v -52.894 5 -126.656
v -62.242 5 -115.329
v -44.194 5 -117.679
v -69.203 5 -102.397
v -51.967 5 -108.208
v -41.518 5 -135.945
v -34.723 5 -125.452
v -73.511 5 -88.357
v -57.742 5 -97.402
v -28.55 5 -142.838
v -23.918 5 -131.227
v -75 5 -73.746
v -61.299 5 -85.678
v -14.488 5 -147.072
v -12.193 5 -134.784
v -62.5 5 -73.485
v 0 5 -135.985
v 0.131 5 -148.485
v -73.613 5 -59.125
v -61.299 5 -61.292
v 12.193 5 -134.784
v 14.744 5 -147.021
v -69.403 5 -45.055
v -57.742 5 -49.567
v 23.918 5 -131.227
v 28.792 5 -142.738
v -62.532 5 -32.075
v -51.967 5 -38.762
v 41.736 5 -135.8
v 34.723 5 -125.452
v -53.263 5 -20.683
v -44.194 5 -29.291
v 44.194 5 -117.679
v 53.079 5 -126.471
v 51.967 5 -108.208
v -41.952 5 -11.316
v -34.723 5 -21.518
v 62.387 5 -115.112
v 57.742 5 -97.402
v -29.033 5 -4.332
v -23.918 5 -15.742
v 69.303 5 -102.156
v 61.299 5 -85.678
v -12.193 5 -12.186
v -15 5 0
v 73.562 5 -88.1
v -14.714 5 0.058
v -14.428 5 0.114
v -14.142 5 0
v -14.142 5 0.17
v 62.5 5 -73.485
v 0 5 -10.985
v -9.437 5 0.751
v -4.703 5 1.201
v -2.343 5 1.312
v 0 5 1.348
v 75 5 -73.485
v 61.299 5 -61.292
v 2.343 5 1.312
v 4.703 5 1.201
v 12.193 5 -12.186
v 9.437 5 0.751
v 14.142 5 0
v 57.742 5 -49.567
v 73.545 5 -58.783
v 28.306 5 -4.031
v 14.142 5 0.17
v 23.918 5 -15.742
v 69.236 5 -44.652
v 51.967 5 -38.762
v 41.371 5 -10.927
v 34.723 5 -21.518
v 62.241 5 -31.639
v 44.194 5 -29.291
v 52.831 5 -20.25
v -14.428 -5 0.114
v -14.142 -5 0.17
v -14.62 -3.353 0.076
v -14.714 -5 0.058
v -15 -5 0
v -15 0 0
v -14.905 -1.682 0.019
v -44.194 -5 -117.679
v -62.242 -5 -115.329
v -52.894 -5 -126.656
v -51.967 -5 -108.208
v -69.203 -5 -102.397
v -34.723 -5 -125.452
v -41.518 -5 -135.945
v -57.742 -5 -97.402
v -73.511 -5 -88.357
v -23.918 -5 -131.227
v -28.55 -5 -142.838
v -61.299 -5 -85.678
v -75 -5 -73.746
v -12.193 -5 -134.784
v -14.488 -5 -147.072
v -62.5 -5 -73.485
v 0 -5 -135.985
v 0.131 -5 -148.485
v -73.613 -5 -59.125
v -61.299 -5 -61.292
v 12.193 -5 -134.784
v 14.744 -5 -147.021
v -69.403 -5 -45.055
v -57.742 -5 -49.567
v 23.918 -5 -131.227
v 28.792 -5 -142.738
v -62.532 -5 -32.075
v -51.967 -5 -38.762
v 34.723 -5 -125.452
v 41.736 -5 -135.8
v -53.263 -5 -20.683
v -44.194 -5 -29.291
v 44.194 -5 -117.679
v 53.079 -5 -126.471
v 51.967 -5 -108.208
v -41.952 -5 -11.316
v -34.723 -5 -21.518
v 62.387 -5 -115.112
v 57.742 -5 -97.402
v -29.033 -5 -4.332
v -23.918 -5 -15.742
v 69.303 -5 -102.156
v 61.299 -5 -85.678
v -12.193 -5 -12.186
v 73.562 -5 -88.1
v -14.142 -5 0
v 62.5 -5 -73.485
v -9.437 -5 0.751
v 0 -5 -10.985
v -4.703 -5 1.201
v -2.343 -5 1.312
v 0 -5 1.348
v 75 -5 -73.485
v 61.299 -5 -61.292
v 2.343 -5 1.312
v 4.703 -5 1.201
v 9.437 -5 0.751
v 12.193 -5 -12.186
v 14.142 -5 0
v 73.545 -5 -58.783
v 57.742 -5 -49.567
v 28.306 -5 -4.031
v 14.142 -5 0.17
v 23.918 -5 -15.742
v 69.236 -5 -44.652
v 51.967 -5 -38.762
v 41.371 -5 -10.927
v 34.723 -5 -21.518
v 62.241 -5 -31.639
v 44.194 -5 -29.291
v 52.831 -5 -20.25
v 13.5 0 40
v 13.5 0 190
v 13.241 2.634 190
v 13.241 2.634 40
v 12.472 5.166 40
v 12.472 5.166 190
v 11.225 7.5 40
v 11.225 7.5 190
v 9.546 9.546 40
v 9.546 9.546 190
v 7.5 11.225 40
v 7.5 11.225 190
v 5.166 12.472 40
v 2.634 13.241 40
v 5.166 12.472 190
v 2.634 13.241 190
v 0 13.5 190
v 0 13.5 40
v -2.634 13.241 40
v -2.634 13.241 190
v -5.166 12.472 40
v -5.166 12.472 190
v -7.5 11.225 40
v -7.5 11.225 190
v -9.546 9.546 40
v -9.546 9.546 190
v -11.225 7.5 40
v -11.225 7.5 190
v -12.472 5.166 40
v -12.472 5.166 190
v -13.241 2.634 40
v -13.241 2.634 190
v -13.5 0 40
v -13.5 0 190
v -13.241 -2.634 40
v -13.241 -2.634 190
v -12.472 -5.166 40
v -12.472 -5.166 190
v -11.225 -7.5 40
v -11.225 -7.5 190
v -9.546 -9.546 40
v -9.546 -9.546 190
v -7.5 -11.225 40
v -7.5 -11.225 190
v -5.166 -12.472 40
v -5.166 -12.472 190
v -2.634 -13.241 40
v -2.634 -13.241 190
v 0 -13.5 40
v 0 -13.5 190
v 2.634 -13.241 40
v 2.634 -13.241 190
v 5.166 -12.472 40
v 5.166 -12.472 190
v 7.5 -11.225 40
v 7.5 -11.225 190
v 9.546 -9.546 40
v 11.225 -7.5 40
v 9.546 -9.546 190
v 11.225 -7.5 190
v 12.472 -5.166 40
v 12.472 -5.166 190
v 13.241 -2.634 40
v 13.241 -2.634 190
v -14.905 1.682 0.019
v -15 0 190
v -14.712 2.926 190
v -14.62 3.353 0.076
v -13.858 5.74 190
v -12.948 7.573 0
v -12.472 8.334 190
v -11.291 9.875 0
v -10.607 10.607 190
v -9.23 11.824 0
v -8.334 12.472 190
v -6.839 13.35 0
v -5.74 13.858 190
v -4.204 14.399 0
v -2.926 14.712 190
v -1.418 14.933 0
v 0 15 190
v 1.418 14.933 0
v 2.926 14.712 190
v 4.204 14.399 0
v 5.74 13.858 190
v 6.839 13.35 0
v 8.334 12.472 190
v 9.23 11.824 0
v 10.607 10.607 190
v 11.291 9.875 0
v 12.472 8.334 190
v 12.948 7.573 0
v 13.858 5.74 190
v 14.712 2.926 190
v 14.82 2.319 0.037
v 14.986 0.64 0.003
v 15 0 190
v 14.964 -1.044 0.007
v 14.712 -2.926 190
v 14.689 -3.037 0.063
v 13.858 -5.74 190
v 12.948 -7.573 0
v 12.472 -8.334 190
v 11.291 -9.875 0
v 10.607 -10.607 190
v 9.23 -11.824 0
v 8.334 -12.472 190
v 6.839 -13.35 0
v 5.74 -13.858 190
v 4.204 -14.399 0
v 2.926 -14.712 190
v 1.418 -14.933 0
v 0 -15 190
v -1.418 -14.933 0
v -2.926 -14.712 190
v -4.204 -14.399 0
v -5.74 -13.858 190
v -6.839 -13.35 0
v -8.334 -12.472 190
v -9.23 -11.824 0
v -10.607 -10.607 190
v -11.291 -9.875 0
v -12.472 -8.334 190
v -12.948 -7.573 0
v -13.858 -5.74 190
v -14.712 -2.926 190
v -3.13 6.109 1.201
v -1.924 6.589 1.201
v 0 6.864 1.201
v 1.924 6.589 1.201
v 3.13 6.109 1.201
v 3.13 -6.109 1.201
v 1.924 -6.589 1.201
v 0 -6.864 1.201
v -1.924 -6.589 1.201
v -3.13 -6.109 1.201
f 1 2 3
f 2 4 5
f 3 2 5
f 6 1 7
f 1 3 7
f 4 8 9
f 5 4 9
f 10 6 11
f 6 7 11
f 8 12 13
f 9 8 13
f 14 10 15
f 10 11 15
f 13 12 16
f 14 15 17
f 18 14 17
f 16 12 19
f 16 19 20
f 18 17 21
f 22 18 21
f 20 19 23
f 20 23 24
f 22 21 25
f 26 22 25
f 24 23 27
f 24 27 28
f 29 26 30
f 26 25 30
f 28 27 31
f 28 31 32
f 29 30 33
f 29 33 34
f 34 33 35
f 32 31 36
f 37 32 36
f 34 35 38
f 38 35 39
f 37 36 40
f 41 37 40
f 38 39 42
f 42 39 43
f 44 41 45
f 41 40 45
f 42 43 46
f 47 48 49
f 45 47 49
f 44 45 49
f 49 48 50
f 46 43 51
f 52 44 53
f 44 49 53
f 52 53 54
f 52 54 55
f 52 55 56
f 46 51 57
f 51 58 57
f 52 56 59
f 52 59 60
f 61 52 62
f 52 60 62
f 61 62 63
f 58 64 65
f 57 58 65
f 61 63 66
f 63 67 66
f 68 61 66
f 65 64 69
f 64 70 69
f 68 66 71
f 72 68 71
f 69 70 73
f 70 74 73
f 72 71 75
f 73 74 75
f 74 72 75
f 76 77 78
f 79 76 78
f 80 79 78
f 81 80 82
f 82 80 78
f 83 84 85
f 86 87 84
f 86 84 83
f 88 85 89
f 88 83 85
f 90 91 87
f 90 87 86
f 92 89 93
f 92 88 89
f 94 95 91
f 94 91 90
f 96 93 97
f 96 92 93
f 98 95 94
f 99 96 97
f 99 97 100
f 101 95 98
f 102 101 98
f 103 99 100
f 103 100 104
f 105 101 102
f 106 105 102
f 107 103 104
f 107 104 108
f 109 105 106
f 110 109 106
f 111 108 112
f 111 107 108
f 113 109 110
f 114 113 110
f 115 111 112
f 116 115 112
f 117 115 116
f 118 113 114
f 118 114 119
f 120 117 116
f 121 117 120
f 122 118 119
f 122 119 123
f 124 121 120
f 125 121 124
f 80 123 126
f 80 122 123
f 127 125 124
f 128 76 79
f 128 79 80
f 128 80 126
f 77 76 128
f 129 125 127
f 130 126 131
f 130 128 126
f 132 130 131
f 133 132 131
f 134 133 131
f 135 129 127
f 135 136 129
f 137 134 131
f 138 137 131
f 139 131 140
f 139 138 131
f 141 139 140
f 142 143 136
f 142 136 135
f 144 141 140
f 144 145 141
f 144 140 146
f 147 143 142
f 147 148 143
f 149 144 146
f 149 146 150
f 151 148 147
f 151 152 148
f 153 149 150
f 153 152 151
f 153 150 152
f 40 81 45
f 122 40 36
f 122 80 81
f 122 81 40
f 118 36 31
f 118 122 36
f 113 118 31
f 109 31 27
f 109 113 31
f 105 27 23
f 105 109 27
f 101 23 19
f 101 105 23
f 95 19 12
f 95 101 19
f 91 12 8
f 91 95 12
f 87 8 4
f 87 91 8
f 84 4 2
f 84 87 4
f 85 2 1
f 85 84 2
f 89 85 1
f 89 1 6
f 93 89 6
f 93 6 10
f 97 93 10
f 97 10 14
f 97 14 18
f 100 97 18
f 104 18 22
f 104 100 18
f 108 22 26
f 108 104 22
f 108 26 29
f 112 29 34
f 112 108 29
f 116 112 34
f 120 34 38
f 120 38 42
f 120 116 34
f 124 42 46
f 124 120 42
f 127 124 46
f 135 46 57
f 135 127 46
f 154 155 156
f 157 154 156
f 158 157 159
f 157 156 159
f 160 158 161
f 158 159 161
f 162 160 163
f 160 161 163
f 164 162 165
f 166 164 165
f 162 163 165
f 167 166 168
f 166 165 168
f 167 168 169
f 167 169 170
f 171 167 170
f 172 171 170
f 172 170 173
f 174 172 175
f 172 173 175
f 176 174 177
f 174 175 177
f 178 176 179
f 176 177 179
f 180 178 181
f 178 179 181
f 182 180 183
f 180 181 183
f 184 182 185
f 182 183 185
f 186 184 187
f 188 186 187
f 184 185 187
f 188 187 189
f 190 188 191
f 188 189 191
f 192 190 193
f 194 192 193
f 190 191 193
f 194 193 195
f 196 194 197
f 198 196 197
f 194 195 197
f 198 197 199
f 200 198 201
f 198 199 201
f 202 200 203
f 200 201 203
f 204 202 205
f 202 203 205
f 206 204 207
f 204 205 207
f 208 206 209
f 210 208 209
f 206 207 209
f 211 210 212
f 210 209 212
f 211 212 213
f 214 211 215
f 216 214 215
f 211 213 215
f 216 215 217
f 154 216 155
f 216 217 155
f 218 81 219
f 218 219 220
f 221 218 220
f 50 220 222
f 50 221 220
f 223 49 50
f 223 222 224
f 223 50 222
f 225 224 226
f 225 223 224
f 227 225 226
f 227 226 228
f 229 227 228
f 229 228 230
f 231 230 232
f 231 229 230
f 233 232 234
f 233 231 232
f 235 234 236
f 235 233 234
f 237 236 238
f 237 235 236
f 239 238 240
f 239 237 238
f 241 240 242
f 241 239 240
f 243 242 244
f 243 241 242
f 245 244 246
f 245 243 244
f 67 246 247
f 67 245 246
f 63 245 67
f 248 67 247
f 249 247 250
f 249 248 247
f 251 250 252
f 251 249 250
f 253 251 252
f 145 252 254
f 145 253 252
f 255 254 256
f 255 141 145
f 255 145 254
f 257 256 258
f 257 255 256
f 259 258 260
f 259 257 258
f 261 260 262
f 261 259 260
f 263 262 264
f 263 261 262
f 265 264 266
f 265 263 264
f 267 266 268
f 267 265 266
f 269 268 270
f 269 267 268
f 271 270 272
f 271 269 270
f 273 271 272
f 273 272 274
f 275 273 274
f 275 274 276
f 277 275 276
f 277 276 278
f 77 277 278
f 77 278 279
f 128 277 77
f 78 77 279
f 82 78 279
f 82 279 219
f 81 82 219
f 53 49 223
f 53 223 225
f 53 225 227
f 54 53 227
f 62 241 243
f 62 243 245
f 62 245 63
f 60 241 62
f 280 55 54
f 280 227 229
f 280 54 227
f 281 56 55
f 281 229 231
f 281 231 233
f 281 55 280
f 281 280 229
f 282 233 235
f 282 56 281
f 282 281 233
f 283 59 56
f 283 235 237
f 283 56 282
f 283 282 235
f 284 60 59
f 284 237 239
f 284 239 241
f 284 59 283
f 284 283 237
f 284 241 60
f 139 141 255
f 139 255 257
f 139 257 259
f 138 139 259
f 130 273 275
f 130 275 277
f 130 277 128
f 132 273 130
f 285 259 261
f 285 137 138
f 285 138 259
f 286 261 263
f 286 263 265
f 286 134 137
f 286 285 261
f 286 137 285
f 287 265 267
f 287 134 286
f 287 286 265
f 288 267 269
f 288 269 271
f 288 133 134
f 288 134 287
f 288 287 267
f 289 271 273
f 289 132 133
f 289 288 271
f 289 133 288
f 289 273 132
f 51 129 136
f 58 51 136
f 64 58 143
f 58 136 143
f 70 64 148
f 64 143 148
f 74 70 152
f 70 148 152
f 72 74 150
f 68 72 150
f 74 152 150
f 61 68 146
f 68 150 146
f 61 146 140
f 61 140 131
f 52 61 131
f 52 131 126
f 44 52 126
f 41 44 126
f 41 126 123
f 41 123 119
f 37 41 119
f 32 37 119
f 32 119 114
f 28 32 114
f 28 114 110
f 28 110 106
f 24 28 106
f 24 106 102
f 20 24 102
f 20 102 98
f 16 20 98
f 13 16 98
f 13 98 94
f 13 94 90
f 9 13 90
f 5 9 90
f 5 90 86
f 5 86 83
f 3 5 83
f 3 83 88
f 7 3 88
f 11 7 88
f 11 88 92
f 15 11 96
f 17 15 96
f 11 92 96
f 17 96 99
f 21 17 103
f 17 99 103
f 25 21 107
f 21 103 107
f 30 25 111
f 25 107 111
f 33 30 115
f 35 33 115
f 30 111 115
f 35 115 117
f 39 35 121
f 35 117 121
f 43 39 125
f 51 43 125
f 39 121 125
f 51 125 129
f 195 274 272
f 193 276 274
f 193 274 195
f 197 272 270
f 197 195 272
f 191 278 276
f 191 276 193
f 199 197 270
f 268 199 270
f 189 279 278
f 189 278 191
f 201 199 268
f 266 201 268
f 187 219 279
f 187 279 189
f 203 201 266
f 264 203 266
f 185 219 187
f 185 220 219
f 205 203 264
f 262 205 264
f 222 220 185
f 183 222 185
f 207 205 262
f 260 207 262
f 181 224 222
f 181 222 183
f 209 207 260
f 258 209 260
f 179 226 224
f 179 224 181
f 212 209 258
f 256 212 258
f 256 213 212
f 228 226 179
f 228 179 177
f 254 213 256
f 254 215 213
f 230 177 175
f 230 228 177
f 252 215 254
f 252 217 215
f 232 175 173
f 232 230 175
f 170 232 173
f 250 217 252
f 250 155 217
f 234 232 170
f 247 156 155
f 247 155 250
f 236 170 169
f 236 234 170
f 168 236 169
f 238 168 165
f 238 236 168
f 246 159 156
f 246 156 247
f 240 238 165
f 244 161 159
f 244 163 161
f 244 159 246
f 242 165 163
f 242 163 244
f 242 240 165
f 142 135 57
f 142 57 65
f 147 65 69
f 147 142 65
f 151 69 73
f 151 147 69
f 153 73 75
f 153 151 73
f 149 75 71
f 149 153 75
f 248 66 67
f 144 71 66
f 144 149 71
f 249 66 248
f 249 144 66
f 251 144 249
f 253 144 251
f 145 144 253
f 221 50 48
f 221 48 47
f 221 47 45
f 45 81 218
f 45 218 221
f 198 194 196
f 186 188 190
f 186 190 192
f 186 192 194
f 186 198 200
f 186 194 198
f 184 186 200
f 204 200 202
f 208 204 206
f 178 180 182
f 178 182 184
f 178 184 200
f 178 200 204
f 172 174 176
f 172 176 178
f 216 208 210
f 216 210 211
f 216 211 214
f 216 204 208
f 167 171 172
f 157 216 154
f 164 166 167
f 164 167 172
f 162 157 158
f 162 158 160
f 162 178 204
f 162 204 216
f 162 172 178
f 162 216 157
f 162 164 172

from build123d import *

# Parameters (mm, degrees)
F2_DEPTH = 5
F3_R     = 62.5
F4_DEPTH = 25
F5_R     = 13.5
F6_DEPTH = 150


with BuildPart() as f1:
    # F0 (on Front) → F1 (revolve)
    with BuildSketch(Plane.XZ):
        with BuildLine():
            ThreePointArc((-15, 0), (-7.538172, 1.135519), (0, 1.515308))
            Line((0, 1.515308), (0, 190))
            Line((0, 190), (-15, 190))
            Line((-15, 190), (-15, 0))
        make_face()
    revolve(axis=Axis((0, 0, 81.138), (0, 0, -1)))

    # F0 (on Front) → F2 (join, symmetric)
    with BuildSketch(Plane.XZ):
        with BuildLine():
            Line((-15, 0), (0, 0))
            Line((0, 0), (0, 1.515308))
            ThreePointArc((0, 1.515308), (-7.538172, 1.135519), (-15, 0))
        make_face()
        with BuildLine():
            Line((0, 1.515308), (0, 0))
            Line((0, 0), (-15, 0))
            ThreePointArc((-15, 0), (-47.434165, -131.579442), (75, -73.484692))
            ThreePointArc((75, -73.484692), (53.033009, -20.451684), (0, 1.515308))
        make_face()
    extrude(amount=F2_DEPTH, both=True)

    # F3 (on face) → F4 (cut)
    with BuildSketch(Plane.XZ.offset(5)):
        with Locations((0, -73.484692)):
            Circle(F3_R)
    extrude(amount=-F4_DEPTH, mode=Mode.SUBTRACT)

    # F5 (on face) → F6 (cut)
    with BuildSketch(Plane.XY.offset(190)):
        Circle(F5_R)
    extrude(amount=-F6_DEPTH, mode=Mode.SUBTRACT)


solid = f1.part
